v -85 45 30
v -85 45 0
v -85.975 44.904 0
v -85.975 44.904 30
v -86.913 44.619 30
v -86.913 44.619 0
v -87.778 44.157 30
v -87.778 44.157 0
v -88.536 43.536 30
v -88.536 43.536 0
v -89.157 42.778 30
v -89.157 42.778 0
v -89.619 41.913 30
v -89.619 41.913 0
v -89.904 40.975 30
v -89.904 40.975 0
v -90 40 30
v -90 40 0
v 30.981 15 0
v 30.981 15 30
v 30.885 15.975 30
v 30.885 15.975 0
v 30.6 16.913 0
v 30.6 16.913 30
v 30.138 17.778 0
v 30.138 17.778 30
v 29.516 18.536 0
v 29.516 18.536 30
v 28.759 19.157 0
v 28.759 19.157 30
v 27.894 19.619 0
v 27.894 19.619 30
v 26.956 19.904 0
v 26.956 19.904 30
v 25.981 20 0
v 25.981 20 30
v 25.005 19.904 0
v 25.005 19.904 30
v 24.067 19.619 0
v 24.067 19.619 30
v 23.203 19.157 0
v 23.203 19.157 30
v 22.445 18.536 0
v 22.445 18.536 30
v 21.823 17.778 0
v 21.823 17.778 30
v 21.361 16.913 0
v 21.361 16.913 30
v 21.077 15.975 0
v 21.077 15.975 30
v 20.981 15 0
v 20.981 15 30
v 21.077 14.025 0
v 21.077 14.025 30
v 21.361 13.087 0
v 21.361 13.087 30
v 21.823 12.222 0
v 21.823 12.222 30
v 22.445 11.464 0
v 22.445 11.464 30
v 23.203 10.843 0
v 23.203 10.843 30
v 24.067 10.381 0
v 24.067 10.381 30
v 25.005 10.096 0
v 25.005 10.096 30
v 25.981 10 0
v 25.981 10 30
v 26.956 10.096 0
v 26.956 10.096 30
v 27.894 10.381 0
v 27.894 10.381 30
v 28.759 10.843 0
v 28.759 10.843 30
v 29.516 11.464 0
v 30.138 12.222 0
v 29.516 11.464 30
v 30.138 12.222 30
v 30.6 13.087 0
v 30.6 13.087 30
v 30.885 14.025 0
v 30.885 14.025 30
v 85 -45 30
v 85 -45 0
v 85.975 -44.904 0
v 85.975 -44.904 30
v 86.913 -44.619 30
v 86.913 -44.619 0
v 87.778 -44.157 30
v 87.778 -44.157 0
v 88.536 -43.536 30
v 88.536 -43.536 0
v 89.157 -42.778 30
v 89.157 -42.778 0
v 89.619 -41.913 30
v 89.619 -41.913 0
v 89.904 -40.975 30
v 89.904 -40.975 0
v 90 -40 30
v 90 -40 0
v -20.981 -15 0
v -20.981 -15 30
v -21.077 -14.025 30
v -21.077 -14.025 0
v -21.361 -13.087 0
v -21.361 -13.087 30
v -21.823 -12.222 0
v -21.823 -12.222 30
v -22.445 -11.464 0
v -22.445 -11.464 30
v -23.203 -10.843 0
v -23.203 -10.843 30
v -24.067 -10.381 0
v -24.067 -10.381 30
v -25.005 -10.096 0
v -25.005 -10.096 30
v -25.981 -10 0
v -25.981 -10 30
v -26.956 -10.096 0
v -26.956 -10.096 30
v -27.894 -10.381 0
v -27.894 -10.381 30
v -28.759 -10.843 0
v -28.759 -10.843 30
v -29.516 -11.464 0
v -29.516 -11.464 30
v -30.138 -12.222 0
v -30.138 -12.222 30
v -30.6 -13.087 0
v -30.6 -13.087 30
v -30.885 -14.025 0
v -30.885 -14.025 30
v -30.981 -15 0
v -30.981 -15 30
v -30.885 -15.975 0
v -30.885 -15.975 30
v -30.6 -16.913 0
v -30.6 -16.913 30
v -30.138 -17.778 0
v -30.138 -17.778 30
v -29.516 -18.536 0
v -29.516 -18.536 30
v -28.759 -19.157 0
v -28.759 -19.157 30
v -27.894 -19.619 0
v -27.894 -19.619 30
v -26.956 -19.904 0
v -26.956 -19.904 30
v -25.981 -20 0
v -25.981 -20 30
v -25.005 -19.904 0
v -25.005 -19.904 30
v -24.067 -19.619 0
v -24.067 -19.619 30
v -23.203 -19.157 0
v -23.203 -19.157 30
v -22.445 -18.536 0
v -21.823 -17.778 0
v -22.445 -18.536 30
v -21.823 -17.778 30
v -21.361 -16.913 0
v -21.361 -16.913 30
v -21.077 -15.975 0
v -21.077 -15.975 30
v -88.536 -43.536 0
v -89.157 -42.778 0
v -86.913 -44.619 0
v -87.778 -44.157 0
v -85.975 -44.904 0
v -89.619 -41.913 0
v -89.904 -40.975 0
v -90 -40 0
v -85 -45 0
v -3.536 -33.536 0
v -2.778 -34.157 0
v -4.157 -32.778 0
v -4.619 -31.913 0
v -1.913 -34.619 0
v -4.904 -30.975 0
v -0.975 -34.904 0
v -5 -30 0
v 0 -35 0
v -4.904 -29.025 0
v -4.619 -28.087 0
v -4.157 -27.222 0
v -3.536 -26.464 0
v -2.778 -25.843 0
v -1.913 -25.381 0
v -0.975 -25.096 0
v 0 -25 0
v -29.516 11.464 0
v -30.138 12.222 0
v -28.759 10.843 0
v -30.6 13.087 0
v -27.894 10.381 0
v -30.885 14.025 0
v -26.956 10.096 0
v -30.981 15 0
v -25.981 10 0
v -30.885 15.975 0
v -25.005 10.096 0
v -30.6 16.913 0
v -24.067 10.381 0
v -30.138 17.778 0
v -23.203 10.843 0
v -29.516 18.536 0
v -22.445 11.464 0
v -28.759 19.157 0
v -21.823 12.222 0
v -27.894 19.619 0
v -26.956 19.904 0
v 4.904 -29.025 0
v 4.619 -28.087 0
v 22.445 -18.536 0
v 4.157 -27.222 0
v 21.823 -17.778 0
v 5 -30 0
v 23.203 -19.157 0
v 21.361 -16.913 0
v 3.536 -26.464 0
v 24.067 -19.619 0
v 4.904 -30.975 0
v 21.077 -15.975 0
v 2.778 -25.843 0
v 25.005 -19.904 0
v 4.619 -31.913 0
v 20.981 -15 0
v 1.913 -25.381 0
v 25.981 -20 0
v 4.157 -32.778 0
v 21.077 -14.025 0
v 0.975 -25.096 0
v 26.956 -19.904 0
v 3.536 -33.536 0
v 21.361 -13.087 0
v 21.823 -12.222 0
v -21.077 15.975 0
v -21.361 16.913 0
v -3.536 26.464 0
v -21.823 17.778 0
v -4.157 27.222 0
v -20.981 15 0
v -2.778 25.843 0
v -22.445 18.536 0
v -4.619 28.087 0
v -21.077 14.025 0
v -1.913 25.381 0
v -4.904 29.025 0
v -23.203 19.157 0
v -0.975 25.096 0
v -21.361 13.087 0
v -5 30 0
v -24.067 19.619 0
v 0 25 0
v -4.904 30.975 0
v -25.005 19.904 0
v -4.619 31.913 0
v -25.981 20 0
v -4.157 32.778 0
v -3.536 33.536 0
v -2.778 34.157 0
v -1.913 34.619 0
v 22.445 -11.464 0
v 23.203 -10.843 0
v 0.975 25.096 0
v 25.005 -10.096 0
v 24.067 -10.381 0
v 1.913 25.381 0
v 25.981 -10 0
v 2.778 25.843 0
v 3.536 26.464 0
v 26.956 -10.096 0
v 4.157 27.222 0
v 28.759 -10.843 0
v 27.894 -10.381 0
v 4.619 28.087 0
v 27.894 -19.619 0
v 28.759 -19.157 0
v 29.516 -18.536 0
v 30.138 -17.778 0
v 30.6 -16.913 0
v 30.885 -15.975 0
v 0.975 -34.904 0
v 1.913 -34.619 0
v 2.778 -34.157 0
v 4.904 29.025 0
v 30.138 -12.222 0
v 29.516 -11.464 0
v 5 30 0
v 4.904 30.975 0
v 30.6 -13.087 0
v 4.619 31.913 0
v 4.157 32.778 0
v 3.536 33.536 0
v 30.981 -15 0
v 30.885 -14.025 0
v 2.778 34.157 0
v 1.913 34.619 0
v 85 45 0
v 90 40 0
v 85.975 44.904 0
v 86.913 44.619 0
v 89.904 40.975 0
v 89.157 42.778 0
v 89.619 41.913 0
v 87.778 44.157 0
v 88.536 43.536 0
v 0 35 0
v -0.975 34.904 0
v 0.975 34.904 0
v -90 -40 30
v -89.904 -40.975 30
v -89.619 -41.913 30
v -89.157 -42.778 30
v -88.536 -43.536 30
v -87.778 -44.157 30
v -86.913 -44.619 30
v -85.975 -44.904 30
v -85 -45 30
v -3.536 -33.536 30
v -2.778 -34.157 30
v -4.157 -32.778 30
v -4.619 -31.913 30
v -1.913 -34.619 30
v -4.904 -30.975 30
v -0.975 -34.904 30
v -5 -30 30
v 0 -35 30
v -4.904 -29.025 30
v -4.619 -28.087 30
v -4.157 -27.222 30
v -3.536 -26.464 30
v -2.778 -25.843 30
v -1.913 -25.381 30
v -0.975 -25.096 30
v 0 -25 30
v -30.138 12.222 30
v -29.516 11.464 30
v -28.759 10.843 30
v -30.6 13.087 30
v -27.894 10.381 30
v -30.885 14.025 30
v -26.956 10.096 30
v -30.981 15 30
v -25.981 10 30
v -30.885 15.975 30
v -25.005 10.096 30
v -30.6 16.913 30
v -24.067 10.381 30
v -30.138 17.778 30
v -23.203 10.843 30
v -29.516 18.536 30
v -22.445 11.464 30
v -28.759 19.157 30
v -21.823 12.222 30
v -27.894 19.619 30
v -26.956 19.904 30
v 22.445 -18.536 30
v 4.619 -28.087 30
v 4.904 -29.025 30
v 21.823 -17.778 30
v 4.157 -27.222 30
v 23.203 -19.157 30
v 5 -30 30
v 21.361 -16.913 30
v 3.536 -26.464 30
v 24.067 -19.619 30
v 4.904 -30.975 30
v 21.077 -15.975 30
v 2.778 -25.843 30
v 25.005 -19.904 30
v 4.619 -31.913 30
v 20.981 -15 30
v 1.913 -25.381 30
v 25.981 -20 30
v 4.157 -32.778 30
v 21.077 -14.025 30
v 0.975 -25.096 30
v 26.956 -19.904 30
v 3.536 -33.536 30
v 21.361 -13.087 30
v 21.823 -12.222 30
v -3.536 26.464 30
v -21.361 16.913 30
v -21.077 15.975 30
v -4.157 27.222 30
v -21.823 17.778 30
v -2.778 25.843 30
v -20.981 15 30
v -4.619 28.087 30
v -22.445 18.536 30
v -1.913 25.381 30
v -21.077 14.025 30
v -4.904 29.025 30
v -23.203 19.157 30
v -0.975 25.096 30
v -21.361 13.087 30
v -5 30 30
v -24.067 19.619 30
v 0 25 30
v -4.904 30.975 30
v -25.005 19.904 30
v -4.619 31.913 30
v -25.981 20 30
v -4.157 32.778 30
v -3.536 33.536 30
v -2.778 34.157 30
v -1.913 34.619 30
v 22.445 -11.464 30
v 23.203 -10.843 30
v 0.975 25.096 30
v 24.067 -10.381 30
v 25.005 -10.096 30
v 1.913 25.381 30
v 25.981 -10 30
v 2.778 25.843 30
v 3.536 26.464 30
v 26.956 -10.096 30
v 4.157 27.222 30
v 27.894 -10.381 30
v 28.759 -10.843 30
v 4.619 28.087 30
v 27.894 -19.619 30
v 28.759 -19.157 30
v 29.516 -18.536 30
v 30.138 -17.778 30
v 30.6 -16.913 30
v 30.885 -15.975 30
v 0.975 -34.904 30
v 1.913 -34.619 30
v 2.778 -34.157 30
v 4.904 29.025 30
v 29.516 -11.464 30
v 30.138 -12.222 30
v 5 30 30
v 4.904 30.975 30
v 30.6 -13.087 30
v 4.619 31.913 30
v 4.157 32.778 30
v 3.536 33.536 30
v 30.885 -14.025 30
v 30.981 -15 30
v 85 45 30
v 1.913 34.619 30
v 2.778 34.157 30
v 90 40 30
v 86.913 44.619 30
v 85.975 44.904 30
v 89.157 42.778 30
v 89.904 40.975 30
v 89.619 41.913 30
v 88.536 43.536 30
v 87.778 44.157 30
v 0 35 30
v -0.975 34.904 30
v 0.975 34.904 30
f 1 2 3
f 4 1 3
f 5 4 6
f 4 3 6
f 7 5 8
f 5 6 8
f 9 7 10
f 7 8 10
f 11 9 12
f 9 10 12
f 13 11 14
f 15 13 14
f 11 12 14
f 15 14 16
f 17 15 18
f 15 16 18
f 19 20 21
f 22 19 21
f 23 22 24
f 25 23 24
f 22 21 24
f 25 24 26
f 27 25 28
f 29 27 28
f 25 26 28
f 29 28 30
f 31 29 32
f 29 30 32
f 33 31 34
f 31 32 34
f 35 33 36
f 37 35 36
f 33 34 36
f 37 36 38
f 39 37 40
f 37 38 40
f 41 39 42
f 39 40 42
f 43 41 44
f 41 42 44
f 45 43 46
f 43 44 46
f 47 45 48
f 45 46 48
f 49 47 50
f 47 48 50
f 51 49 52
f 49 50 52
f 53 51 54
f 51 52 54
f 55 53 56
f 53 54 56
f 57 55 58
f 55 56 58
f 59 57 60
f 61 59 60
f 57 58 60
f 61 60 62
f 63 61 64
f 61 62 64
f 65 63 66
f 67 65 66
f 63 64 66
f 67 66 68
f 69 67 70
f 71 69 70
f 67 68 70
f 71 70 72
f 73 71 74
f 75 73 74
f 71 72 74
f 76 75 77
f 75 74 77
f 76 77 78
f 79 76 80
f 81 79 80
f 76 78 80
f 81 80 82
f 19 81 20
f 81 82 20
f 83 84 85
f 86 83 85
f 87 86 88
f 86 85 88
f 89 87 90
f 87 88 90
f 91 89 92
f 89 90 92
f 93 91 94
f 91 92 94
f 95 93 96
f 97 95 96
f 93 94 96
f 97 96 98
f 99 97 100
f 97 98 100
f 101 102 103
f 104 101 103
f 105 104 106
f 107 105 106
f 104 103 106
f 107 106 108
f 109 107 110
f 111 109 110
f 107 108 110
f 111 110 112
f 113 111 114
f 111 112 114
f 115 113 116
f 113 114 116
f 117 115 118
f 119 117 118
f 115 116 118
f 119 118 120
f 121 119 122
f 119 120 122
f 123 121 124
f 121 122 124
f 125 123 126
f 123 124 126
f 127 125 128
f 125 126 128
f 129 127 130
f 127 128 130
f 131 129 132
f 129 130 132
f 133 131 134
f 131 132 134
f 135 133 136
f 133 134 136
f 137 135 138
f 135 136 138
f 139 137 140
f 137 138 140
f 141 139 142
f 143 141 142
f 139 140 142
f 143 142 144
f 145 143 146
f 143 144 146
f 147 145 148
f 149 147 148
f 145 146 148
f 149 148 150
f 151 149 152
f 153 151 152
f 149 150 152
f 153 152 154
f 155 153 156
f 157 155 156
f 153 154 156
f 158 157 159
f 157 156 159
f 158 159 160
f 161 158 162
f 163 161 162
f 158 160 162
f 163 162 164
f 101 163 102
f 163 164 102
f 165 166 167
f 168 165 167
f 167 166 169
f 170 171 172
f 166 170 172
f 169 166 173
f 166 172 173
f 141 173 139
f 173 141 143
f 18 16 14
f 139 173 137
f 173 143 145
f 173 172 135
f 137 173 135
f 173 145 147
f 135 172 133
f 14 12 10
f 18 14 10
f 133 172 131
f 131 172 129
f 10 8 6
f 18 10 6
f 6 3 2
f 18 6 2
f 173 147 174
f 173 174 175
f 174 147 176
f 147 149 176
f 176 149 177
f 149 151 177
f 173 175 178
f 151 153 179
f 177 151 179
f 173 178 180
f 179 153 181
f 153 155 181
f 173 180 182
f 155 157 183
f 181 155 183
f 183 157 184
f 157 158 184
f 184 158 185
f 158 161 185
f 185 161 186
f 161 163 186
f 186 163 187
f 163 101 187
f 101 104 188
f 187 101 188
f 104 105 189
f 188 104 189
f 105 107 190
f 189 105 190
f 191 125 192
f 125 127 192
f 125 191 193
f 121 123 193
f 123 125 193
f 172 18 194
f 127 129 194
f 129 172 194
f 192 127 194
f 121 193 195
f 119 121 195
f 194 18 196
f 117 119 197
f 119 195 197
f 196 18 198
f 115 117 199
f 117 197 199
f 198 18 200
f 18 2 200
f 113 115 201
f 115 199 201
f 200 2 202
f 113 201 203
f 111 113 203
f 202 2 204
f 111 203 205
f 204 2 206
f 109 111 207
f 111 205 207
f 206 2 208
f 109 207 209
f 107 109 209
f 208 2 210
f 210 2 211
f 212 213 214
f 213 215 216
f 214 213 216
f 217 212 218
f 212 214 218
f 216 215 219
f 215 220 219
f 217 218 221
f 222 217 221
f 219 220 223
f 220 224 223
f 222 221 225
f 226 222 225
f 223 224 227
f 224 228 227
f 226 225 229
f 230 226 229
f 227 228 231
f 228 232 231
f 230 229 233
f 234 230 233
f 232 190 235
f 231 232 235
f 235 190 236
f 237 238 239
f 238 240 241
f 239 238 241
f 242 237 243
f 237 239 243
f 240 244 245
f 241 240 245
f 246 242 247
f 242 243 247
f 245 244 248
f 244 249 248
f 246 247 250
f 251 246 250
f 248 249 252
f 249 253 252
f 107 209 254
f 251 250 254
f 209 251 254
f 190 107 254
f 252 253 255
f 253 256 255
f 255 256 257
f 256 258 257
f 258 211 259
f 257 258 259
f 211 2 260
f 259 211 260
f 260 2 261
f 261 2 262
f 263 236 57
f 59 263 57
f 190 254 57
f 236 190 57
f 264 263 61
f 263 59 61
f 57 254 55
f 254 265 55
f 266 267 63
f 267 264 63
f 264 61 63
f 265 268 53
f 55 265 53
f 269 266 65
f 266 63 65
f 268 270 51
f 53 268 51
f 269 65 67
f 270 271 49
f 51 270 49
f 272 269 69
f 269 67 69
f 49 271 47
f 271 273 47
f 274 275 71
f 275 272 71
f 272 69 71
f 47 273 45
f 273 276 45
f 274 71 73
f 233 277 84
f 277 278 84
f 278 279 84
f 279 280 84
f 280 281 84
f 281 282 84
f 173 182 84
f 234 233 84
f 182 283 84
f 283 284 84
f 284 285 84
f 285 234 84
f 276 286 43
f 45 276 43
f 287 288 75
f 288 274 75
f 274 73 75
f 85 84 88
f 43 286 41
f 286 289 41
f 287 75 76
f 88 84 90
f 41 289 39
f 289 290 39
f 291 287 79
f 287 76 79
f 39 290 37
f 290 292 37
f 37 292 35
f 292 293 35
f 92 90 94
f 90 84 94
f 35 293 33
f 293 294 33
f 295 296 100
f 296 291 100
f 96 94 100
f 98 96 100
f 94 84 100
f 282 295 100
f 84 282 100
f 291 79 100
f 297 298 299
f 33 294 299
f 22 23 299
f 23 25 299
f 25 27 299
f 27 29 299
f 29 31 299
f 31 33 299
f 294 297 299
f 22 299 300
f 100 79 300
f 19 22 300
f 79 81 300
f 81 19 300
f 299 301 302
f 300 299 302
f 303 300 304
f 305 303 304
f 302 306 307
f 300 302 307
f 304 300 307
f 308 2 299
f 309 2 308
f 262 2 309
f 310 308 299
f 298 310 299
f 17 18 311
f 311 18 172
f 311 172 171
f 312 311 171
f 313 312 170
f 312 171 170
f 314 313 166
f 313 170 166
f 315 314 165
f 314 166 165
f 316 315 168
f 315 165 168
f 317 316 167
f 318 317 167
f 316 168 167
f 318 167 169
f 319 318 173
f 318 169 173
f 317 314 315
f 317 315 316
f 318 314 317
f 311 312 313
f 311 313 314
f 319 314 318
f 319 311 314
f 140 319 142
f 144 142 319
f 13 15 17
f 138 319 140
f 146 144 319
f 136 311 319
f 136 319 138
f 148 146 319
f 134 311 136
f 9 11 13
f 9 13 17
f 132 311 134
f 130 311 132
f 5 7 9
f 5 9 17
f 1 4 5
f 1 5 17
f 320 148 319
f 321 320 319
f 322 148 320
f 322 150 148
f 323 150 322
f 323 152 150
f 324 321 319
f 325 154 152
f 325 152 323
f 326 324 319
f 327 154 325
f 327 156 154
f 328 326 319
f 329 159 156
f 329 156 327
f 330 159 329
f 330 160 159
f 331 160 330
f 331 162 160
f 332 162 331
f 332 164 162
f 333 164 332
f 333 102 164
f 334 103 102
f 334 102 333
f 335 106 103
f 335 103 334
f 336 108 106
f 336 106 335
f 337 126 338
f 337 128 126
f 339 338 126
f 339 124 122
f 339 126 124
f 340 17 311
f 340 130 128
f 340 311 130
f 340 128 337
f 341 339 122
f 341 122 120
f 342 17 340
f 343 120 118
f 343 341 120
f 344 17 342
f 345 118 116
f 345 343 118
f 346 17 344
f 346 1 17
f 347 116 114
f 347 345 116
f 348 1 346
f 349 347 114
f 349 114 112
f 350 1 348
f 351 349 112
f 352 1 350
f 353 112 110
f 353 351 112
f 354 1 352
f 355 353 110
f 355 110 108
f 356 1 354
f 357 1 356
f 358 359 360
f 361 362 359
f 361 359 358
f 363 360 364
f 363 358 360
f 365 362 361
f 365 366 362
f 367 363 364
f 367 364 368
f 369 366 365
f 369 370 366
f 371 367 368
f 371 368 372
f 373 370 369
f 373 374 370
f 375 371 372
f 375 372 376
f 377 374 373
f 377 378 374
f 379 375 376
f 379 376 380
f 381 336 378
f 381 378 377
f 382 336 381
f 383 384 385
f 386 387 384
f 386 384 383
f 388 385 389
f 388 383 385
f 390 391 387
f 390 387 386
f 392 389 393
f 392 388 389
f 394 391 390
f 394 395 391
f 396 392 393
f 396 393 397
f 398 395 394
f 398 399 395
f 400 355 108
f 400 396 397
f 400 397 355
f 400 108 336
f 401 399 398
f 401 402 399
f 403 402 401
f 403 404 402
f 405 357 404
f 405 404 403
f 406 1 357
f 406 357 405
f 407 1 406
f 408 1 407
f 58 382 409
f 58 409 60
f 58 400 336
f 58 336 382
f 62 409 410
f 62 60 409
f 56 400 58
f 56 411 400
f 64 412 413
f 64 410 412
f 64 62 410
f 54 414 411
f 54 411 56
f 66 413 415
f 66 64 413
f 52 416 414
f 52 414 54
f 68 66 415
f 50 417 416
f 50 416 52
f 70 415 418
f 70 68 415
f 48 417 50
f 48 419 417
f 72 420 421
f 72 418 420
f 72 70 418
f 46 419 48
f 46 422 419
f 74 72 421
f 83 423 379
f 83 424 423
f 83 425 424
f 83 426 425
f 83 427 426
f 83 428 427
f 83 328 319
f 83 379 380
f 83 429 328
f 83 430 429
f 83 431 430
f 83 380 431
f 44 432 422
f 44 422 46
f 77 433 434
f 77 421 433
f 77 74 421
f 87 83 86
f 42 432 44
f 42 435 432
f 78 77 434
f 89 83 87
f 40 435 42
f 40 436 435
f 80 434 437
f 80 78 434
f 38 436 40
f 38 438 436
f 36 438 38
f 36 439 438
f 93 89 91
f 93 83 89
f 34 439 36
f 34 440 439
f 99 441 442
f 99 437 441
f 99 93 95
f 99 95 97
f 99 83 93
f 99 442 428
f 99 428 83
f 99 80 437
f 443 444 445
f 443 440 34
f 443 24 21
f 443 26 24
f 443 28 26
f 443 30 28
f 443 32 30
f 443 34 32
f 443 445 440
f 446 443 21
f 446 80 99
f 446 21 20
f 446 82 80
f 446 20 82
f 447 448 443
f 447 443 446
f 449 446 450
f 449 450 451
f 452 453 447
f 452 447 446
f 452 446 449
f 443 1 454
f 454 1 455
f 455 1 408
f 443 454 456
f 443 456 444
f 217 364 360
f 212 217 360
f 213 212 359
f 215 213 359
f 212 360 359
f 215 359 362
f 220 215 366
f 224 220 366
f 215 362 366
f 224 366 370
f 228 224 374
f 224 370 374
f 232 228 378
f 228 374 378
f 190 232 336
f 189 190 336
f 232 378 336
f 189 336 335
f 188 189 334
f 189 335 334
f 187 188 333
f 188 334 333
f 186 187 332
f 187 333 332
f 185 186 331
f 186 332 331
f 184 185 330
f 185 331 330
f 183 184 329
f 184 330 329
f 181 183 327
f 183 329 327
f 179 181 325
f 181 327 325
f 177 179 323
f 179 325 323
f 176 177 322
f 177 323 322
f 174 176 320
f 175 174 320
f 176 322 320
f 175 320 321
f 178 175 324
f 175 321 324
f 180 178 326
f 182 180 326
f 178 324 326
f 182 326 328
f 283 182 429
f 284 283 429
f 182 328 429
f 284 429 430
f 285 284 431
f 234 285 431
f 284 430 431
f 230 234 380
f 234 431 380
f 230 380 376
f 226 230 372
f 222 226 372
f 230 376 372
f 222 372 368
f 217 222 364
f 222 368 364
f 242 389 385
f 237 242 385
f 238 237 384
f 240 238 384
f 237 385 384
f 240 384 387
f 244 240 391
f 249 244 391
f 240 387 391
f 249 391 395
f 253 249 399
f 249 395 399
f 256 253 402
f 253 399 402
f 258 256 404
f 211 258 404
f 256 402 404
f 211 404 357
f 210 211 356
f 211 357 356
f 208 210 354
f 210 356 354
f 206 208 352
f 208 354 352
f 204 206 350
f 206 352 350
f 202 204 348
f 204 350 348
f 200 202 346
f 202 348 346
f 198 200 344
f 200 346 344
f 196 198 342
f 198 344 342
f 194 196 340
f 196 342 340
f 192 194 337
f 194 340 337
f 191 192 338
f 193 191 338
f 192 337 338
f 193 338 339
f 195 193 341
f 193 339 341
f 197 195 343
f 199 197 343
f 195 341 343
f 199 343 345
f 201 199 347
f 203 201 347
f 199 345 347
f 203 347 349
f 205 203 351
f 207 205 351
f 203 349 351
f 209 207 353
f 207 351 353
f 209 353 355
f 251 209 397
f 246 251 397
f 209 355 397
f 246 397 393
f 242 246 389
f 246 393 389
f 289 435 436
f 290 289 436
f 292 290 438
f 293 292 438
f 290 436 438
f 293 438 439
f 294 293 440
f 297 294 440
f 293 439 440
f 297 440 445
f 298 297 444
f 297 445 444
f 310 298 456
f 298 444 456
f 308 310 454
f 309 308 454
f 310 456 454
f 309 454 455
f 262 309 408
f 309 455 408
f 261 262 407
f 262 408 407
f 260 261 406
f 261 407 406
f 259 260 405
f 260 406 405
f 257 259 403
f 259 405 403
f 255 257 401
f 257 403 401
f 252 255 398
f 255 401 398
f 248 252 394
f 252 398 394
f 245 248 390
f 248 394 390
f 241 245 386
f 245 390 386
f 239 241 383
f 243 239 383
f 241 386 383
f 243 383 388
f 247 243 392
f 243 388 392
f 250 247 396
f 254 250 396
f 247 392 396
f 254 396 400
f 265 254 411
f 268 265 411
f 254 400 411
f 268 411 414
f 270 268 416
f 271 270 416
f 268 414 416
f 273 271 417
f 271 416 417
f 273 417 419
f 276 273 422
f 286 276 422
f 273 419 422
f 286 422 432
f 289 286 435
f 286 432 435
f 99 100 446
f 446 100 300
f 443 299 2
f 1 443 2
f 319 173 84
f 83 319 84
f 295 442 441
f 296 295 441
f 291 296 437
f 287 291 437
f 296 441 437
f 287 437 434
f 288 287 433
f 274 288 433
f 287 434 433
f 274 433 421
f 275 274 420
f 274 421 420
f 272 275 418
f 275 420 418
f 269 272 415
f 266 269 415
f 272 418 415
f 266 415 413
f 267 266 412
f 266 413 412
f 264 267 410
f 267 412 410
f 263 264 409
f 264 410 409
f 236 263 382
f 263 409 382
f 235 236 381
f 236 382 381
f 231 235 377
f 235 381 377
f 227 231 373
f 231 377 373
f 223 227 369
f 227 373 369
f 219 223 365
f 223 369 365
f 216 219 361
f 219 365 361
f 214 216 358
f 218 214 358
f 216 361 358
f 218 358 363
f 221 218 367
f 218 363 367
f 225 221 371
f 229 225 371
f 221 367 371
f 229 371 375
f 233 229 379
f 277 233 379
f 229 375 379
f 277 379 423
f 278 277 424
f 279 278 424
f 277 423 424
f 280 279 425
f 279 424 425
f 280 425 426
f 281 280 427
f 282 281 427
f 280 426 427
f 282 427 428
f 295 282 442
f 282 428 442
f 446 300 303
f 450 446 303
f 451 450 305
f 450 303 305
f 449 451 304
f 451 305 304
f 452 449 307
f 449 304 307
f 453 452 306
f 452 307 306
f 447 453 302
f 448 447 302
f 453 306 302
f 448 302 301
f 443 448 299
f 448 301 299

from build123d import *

# Parameters (mm, degrees)
RESSALTO_EXTRUS_O1_DEPTH = 30
ESBO_O2_R                = 5
CORTE_EXTRUS_O1_DEPTH    = 30


with BuildPart() as part:
    # Esboço1 → Ressalto-extrusão1 (new body)
    with BuildSketch(Plane.XY):
        with BuildLine():
            Line((-85, -45), (85, -45))
            ThreePointArc((85, -45), (88.535533906, -43.535533906), (90, -40))
            Line((90, -40), (90, 40))
            ThreePointArc((90, 40), (88.535533906, 43.535533906), (85, 45))
            Line((85, 45), (-85, 45))
            ThreePointArc((-85, 45), (-88.535533906, 43.535533906), (-90, 40))
            Line((-90, 40), (-90, -40))
            ThreePointArc((-90, -40), (-88.535533906, -43.535533906), (-85, -45))
        make_face()
    extrude(amount=RESSALTO_EXTRUS_O1_DEPTH)

    # Esboço2 → Corte-extrusão1 (cut)
    with BuildSketch(Plane.XY.offset(30)):
        with Locations((0, 30)):
            Circle(ESBO_O2_R)
        with Locations((25.980762114, 15)):
            Circle(ESBO_O2_R)
        with Locations((25.980762114, -15)):
            Circle(ESBO_O2_R)
        with Locations((0, -30)):
            Circle(ESBO_O2_R)
        with Locations((-25.980762114, -15)):
            Circle(ESBO_O2_R)
        with Locations((-25.980762114, 15)):
            Circle(ESBO_O2_R)
    extrude(amount=-CORTE_EXTRUS_O1_DEPTH, mode=Mode.SUBTRACT)


solid = part.part
